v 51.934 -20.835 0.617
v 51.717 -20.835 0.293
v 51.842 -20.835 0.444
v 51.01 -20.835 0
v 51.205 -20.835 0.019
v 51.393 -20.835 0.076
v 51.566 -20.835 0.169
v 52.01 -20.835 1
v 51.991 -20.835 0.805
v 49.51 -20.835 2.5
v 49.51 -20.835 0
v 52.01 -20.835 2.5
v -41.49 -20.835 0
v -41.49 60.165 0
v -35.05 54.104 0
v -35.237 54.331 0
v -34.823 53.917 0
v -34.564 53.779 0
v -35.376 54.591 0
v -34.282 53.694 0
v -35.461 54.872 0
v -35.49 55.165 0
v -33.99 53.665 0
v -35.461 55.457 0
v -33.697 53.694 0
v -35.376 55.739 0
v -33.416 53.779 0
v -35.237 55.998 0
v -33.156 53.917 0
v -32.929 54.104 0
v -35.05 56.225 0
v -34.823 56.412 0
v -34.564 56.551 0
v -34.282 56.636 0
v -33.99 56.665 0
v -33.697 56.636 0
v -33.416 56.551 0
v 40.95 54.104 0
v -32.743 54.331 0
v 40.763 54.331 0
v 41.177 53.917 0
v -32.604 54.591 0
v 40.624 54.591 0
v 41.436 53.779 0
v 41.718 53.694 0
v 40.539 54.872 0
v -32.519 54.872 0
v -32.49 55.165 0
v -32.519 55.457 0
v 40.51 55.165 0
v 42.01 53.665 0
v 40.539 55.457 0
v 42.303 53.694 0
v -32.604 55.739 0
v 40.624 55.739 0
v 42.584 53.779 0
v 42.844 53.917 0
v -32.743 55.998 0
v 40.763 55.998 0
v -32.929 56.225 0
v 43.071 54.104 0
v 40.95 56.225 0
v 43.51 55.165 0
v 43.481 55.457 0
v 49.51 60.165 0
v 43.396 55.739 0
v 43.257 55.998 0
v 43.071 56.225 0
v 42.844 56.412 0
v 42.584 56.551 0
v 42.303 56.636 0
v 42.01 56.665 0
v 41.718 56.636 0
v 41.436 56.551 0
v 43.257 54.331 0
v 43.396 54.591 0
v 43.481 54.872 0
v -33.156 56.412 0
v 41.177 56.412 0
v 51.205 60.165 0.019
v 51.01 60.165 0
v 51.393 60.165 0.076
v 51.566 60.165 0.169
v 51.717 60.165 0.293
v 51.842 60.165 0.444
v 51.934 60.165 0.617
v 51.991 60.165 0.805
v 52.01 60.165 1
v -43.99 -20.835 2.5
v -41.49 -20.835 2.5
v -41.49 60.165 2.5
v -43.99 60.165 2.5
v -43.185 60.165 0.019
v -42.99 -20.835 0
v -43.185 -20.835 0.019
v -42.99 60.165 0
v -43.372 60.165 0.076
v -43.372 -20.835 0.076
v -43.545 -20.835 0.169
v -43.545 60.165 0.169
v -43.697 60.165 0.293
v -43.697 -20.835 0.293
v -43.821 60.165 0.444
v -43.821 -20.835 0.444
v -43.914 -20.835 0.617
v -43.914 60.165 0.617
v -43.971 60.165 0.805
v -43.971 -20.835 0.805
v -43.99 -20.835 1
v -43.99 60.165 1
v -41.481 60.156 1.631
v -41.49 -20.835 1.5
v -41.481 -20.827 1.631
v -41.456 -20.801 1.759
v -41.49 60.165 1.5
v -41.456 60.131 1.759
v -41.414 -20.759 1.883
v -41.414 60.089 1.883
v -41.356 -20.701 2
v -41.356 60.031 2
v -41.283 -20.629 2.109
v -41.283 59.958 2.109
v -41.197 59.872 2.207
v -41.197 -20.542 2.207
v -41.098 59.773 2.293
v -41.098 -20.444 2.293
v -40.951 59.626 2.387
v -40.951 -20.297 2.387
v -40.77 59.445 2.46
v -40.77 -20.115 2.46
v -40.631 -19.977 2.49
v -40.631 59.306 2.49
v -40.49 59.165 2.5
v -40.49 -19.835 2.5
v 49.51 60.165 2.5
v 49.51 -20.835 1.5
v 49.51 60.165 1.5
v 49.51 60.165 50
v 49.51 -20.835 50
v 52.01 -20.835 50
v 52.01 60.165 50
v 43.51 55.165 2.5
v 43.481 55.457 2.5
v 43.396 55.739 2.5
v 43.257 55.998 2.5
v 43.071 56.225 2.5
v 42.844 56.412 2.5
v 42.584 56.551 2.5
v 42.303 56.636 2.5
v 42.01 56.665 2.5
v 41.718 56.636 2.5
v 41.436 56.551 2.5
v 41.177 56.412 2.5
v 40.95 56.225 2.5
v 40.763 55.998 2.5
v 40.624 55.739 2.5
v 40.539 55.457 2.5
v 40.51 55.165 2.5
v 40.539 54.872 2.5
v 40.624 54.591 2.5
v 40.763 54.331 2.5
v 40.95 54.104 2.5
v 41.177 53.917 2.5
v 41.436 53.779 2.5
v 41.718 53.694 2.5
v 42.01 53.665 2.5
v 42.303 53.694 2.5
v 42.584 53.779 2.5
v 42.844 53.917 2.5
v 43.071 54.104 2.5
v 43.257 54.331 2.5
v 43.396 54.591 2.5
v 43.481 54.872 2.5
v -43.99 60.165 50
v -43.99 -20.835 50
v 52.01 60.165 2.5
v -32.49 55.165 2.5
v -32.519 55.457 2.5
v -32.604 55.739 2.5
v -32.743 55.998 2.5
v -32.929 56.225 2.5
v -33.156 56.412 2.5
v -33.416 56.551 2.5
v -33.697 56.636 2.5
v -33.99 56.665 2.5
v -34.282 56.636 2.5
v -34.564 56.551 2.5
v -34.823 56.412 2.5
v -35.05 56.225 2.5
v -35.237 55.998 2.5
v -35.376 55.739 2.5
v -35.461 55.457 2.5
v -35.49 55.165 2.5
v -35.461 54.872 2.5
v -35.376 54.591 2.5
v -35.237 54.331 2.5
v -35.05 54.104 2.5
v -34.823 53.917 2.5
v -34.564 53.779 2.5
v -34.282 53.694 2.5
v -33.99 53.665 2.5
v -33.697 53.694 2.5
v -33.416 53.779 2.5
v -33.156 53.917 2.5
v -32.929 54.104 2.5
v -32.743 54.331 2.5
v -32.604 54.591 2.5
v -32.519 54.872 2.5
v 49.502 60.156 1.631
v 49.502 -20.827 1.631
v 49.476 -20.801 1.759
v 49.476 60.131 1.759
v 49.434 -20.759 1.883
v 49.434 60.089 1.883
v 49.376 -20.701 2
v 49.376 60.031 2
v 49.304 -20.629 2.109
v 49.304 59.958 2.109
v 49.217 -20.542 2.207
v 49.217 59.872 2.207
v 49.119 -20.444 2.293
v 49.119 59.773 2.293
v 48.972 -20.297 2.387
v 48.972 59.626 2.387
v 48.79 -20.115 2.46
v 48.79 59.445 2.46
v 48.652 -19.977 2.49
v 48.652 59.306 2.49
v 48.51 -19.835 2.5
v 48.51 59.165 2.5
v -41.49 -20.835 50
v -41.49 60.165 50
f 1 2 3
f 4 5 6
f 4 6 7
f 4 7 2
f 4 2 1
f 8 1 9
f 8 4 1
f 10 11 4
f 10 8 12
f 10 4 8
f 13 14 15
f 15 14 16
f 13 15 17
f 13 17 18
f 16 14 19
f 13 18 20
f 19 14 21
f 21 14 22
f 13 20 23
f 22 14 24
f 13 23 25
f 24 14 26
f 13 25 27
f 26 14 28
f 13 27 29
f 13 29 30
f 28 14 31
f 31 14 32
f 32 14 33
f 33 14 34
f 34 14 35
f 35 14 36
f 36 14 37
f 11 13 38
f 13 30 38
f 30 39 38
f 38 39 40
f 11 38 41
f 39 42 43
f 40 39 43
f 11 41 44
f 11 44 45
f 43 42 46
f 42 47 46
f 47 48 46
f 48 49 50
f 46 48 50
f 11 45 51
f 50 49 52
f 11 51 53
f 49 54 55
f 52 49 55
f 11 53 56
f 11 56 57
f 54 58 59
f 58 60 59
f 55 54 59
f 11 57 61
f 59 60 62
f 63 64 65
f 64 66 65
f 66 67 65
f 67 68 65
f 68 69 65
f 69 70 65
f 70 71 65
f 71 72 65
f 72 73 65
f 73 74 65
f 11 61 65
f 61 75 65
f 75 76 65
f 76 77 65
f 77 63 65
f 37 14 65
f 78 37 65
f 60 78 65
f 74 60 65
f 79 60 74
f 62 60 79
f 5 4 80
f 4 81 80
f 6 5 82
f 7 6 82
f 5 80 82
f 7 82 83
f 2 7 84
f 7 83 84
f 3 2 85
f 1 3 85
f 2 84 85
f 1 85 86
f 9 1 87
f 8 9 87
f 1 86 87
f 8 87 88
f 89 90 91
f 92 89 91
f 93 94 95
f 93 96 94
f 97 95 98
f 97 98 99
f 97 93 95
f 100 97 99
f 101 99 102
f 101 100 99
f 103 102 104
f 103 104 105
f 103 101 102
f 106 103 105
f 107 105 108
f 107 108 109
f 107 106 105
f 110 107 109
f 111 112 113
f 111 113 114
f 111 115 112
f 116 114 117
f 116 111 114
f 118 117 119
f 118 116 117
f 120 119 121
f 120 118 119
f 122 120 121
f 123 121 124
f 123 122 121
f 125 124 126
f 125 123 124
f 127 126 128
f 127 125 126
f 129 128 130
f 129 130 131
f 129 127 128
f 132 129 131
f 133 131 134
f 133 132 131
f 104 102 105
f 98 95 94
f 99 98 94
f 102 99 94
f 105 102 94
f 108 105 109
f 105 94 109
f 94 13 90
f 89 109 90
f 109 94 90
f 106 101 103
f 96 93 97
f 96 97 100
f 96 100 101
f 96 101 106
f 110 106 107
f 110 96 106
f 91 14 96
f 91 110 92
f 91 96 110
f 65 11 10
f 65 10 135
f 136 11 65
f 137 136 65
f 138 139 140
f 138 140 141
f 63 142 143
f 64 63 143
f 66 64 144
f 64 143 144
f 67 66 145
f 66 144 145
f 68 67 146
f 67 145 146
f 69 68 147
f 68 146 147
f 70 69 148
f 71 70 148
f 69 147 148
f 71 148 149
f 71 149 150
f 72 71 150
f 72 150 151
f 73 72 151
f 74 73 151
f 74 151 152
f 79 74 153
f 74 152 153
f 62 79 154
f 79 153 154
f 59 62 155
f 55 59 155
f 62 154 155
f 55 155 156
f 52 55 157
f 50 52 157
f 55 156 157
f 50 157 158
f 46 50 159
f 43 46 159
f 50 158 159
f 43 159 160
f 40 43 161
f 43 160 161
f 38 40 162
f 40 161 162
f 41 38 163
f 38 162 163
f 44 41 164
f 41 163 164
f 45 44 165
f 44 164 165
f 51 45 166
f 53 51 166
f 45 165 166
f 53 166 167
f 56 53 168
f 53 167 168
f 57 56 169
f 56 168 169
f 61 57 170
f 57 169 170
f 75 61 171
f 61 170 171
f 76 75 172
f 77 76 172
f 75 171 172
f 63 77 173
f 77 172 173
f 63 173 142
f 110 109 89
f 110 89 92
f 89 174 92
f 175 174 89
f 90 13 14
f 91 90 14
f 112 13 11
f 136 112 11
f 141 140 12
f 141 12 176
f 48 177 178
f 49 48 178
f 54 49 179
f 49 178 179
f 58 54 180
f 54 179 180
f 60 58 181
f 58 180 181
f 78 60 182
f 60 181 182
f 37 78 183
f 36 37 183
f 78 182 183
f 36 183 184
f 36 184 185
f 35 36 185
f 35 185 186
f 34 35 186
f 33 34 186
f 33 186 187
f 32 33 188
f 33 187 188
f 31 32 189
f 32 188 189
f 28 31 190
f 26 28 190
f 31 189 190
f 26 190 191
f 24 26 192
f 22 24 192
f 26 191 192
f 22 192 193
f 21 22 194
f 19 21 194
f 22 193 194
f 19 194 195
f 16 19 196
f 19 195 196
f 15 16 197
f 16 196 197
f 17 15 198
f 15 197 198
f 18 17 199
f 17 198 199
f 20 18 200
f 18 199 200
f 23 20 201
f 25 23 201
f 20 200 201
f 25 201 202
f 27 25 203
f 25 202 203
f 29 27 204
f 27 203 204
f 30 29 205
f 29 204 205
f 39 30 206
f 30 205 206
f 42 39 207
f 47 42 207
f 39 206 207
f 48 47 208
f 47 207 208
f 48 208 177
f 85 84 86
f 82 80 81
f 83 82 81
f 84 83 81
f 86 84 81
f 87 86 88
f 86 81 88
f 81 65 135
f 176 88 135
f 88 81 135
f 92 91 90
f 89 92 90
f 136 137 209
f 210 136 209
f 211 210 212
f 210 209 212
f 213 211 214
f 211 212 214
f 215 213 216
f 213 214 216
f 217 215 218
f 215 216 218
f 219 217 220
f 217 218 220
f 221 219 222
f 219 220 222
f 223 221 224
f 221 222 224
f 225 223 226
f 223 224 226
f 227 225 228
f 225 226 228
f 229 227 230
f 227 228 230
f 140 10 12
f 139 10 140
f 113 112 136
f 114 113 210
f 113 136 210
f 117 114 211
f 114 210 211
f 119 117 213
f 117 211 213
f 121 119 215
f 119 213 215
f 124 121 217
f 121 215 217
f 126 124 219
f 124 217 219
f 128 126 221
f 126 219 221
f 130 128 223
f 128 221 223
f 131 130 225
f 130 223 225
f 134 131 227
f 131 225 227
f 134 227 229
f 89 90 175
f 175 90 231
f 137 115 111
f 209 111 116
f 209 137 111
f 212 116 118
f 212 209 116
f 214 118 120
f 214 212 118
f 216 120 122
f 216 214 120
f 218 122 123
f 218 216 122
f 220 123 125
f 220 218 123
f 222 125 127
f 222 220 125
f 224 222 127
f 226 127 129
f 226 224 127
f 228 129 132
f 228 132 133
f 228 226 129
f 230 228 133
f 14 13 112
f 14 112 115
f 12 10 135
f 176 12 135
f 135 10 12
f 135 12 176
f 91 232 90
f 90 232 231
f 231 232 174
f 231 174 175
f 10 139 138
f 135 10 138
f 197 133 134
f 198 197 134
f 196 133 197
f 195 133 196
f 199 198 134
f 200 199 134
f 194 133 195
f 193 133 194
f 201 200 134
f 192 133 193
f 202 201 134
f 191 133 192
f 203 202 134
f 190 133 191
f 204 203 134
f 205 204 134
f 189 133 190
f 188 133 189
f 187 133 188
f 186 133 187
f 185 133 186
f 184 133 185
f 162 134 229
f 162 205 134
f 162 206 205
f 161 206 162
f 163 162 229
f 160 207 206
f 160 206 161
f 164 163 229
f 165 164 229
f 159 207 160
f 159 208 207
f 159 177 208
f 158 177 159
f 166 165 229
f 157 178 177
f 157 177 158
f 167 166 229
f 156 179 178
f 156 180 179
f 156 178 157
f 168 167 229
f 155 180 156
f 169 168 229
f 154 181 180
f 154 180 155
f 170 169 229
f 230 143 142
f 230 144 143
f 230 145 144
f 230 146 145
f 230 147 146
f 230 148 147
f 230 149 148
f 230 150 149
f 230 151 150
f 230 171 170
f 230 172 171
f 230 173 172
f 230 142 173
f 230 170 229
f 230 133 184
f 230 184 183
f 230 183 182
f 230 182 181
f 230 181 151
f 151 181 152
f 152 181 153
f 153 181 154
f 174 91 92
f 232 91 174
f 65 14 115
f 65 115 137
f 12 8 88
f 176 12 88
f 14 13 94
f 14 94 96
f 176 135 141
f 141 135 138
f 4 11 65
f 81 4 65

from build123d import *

# Parameters (mm, degrees)
F0_W      = 91
F0_H      = 81
F1_DEPTH  = 2.5
F2_W      = 81
F2_H      = 47.5
F3_DEPTH  = 2.5
F4_W      = 81
F4_H      = 47.5
F5_DEPTH  = 2.5
F6_DEPTH  = 2.5
F7_DEPTH  = 2.5
F8_R      = 1
F9_R      = 1
F9_2_R    = 1
F10_R     = 1.5
F11_DEPTH = 2.5


with BuildPart() as f1:
    # F0 (on Top) → F1 (new body)
    with BuildSketch(Plane.XY):
        with Locations((4.0102824569, 19.6646887419)):
            Rectangle(F0_W, F0_H)
    extrude(amount=F1_DEPTH)


with BuildPart() as f3:
    # F2 (on face) → F3 (new body)
    with BuildSketch(Plane(origin=(-41.4897175431, 0, 0), x_dir=(0, -1, 0), z_dir=(-1, 0, 0))):
        with Locations((-19.6646887419, 26.25)):
            Rectangle(F2_W, F2_H)
    extrude(amount=F3_DEPTH)


with BuildPart() as f5:
    # F4 (on face) → F5 (new body)
    with BuildSketch(Plane.YZ.offset(49.5102824569)):
        with Locations((19.6646887419, 26.25)):
            Rectangle(F4_W, F4_H)
    extrude(amount=F5_DEPTH)


with BuildPart() as f6:
    # F6 (new): a face of the model
    f6_faces = [f1.part.faces().sort_by_distance(p)[0] for p in [
        (49.5102824569, 19.6646887419, 1.25),
    ]]
    extrude(f6_faces, amount=F6_DEPTH)

    # F9
    f9_edges = [f6.edges().sort_by_distance(p)[0] for p in [
        (52.010282, 19.664689, 0),
    ]]
    fillet(f9_edges, radius=F9_R)


with BuildPart() as f7:
    # F7 (new): a face of the model
    f7_faces = [f1.part.faces().sort_by_distance(p)[0] for p in [
        (-41.4897175431, 19.6646887419, 1.25),
    ]]
    extrude(f7_faces, amount=F7_DEPTH)

    # F8
    f8_edges = [f7.edges().sort_by_distance(p)[0] for p in [
        (-43.989718, 19.664689, 0),
    ]]
    fillet(f8_edges, radius=F8_R)


with BuildPart() as f1_1:
    add(f1.part)

    # F9#2
    f9_2_edges = [f1_1.edges().sort_by_distance(p)[0] for p in [
        (4.010282, 60.164689, 2.5),
        (-41.489718, 19.664689, 2.5),
        (4.010282, -20.835311, 2.5),
        (49.510282, 19.664689, 2.5),
    ]]
    fillet(f9_2_edges, radius=F9_2_R)

    # F10 (on face) → F11 (cut)
    with BuildSketch(Plane.XY.offset(2.5)):
        with Locations((-33.9897175431, 55.1646887419)):
            Circle(F10_R)
        with Locations((42.0102824569, 55.1646887419)):
            Circle(F10_R)
    extrude(amount=-F11_DEPTH, mode=Mode.SUBTRACT)


solid = Compound([f3.part, f5.part, f6.part, f7.part, f1_1.part])
